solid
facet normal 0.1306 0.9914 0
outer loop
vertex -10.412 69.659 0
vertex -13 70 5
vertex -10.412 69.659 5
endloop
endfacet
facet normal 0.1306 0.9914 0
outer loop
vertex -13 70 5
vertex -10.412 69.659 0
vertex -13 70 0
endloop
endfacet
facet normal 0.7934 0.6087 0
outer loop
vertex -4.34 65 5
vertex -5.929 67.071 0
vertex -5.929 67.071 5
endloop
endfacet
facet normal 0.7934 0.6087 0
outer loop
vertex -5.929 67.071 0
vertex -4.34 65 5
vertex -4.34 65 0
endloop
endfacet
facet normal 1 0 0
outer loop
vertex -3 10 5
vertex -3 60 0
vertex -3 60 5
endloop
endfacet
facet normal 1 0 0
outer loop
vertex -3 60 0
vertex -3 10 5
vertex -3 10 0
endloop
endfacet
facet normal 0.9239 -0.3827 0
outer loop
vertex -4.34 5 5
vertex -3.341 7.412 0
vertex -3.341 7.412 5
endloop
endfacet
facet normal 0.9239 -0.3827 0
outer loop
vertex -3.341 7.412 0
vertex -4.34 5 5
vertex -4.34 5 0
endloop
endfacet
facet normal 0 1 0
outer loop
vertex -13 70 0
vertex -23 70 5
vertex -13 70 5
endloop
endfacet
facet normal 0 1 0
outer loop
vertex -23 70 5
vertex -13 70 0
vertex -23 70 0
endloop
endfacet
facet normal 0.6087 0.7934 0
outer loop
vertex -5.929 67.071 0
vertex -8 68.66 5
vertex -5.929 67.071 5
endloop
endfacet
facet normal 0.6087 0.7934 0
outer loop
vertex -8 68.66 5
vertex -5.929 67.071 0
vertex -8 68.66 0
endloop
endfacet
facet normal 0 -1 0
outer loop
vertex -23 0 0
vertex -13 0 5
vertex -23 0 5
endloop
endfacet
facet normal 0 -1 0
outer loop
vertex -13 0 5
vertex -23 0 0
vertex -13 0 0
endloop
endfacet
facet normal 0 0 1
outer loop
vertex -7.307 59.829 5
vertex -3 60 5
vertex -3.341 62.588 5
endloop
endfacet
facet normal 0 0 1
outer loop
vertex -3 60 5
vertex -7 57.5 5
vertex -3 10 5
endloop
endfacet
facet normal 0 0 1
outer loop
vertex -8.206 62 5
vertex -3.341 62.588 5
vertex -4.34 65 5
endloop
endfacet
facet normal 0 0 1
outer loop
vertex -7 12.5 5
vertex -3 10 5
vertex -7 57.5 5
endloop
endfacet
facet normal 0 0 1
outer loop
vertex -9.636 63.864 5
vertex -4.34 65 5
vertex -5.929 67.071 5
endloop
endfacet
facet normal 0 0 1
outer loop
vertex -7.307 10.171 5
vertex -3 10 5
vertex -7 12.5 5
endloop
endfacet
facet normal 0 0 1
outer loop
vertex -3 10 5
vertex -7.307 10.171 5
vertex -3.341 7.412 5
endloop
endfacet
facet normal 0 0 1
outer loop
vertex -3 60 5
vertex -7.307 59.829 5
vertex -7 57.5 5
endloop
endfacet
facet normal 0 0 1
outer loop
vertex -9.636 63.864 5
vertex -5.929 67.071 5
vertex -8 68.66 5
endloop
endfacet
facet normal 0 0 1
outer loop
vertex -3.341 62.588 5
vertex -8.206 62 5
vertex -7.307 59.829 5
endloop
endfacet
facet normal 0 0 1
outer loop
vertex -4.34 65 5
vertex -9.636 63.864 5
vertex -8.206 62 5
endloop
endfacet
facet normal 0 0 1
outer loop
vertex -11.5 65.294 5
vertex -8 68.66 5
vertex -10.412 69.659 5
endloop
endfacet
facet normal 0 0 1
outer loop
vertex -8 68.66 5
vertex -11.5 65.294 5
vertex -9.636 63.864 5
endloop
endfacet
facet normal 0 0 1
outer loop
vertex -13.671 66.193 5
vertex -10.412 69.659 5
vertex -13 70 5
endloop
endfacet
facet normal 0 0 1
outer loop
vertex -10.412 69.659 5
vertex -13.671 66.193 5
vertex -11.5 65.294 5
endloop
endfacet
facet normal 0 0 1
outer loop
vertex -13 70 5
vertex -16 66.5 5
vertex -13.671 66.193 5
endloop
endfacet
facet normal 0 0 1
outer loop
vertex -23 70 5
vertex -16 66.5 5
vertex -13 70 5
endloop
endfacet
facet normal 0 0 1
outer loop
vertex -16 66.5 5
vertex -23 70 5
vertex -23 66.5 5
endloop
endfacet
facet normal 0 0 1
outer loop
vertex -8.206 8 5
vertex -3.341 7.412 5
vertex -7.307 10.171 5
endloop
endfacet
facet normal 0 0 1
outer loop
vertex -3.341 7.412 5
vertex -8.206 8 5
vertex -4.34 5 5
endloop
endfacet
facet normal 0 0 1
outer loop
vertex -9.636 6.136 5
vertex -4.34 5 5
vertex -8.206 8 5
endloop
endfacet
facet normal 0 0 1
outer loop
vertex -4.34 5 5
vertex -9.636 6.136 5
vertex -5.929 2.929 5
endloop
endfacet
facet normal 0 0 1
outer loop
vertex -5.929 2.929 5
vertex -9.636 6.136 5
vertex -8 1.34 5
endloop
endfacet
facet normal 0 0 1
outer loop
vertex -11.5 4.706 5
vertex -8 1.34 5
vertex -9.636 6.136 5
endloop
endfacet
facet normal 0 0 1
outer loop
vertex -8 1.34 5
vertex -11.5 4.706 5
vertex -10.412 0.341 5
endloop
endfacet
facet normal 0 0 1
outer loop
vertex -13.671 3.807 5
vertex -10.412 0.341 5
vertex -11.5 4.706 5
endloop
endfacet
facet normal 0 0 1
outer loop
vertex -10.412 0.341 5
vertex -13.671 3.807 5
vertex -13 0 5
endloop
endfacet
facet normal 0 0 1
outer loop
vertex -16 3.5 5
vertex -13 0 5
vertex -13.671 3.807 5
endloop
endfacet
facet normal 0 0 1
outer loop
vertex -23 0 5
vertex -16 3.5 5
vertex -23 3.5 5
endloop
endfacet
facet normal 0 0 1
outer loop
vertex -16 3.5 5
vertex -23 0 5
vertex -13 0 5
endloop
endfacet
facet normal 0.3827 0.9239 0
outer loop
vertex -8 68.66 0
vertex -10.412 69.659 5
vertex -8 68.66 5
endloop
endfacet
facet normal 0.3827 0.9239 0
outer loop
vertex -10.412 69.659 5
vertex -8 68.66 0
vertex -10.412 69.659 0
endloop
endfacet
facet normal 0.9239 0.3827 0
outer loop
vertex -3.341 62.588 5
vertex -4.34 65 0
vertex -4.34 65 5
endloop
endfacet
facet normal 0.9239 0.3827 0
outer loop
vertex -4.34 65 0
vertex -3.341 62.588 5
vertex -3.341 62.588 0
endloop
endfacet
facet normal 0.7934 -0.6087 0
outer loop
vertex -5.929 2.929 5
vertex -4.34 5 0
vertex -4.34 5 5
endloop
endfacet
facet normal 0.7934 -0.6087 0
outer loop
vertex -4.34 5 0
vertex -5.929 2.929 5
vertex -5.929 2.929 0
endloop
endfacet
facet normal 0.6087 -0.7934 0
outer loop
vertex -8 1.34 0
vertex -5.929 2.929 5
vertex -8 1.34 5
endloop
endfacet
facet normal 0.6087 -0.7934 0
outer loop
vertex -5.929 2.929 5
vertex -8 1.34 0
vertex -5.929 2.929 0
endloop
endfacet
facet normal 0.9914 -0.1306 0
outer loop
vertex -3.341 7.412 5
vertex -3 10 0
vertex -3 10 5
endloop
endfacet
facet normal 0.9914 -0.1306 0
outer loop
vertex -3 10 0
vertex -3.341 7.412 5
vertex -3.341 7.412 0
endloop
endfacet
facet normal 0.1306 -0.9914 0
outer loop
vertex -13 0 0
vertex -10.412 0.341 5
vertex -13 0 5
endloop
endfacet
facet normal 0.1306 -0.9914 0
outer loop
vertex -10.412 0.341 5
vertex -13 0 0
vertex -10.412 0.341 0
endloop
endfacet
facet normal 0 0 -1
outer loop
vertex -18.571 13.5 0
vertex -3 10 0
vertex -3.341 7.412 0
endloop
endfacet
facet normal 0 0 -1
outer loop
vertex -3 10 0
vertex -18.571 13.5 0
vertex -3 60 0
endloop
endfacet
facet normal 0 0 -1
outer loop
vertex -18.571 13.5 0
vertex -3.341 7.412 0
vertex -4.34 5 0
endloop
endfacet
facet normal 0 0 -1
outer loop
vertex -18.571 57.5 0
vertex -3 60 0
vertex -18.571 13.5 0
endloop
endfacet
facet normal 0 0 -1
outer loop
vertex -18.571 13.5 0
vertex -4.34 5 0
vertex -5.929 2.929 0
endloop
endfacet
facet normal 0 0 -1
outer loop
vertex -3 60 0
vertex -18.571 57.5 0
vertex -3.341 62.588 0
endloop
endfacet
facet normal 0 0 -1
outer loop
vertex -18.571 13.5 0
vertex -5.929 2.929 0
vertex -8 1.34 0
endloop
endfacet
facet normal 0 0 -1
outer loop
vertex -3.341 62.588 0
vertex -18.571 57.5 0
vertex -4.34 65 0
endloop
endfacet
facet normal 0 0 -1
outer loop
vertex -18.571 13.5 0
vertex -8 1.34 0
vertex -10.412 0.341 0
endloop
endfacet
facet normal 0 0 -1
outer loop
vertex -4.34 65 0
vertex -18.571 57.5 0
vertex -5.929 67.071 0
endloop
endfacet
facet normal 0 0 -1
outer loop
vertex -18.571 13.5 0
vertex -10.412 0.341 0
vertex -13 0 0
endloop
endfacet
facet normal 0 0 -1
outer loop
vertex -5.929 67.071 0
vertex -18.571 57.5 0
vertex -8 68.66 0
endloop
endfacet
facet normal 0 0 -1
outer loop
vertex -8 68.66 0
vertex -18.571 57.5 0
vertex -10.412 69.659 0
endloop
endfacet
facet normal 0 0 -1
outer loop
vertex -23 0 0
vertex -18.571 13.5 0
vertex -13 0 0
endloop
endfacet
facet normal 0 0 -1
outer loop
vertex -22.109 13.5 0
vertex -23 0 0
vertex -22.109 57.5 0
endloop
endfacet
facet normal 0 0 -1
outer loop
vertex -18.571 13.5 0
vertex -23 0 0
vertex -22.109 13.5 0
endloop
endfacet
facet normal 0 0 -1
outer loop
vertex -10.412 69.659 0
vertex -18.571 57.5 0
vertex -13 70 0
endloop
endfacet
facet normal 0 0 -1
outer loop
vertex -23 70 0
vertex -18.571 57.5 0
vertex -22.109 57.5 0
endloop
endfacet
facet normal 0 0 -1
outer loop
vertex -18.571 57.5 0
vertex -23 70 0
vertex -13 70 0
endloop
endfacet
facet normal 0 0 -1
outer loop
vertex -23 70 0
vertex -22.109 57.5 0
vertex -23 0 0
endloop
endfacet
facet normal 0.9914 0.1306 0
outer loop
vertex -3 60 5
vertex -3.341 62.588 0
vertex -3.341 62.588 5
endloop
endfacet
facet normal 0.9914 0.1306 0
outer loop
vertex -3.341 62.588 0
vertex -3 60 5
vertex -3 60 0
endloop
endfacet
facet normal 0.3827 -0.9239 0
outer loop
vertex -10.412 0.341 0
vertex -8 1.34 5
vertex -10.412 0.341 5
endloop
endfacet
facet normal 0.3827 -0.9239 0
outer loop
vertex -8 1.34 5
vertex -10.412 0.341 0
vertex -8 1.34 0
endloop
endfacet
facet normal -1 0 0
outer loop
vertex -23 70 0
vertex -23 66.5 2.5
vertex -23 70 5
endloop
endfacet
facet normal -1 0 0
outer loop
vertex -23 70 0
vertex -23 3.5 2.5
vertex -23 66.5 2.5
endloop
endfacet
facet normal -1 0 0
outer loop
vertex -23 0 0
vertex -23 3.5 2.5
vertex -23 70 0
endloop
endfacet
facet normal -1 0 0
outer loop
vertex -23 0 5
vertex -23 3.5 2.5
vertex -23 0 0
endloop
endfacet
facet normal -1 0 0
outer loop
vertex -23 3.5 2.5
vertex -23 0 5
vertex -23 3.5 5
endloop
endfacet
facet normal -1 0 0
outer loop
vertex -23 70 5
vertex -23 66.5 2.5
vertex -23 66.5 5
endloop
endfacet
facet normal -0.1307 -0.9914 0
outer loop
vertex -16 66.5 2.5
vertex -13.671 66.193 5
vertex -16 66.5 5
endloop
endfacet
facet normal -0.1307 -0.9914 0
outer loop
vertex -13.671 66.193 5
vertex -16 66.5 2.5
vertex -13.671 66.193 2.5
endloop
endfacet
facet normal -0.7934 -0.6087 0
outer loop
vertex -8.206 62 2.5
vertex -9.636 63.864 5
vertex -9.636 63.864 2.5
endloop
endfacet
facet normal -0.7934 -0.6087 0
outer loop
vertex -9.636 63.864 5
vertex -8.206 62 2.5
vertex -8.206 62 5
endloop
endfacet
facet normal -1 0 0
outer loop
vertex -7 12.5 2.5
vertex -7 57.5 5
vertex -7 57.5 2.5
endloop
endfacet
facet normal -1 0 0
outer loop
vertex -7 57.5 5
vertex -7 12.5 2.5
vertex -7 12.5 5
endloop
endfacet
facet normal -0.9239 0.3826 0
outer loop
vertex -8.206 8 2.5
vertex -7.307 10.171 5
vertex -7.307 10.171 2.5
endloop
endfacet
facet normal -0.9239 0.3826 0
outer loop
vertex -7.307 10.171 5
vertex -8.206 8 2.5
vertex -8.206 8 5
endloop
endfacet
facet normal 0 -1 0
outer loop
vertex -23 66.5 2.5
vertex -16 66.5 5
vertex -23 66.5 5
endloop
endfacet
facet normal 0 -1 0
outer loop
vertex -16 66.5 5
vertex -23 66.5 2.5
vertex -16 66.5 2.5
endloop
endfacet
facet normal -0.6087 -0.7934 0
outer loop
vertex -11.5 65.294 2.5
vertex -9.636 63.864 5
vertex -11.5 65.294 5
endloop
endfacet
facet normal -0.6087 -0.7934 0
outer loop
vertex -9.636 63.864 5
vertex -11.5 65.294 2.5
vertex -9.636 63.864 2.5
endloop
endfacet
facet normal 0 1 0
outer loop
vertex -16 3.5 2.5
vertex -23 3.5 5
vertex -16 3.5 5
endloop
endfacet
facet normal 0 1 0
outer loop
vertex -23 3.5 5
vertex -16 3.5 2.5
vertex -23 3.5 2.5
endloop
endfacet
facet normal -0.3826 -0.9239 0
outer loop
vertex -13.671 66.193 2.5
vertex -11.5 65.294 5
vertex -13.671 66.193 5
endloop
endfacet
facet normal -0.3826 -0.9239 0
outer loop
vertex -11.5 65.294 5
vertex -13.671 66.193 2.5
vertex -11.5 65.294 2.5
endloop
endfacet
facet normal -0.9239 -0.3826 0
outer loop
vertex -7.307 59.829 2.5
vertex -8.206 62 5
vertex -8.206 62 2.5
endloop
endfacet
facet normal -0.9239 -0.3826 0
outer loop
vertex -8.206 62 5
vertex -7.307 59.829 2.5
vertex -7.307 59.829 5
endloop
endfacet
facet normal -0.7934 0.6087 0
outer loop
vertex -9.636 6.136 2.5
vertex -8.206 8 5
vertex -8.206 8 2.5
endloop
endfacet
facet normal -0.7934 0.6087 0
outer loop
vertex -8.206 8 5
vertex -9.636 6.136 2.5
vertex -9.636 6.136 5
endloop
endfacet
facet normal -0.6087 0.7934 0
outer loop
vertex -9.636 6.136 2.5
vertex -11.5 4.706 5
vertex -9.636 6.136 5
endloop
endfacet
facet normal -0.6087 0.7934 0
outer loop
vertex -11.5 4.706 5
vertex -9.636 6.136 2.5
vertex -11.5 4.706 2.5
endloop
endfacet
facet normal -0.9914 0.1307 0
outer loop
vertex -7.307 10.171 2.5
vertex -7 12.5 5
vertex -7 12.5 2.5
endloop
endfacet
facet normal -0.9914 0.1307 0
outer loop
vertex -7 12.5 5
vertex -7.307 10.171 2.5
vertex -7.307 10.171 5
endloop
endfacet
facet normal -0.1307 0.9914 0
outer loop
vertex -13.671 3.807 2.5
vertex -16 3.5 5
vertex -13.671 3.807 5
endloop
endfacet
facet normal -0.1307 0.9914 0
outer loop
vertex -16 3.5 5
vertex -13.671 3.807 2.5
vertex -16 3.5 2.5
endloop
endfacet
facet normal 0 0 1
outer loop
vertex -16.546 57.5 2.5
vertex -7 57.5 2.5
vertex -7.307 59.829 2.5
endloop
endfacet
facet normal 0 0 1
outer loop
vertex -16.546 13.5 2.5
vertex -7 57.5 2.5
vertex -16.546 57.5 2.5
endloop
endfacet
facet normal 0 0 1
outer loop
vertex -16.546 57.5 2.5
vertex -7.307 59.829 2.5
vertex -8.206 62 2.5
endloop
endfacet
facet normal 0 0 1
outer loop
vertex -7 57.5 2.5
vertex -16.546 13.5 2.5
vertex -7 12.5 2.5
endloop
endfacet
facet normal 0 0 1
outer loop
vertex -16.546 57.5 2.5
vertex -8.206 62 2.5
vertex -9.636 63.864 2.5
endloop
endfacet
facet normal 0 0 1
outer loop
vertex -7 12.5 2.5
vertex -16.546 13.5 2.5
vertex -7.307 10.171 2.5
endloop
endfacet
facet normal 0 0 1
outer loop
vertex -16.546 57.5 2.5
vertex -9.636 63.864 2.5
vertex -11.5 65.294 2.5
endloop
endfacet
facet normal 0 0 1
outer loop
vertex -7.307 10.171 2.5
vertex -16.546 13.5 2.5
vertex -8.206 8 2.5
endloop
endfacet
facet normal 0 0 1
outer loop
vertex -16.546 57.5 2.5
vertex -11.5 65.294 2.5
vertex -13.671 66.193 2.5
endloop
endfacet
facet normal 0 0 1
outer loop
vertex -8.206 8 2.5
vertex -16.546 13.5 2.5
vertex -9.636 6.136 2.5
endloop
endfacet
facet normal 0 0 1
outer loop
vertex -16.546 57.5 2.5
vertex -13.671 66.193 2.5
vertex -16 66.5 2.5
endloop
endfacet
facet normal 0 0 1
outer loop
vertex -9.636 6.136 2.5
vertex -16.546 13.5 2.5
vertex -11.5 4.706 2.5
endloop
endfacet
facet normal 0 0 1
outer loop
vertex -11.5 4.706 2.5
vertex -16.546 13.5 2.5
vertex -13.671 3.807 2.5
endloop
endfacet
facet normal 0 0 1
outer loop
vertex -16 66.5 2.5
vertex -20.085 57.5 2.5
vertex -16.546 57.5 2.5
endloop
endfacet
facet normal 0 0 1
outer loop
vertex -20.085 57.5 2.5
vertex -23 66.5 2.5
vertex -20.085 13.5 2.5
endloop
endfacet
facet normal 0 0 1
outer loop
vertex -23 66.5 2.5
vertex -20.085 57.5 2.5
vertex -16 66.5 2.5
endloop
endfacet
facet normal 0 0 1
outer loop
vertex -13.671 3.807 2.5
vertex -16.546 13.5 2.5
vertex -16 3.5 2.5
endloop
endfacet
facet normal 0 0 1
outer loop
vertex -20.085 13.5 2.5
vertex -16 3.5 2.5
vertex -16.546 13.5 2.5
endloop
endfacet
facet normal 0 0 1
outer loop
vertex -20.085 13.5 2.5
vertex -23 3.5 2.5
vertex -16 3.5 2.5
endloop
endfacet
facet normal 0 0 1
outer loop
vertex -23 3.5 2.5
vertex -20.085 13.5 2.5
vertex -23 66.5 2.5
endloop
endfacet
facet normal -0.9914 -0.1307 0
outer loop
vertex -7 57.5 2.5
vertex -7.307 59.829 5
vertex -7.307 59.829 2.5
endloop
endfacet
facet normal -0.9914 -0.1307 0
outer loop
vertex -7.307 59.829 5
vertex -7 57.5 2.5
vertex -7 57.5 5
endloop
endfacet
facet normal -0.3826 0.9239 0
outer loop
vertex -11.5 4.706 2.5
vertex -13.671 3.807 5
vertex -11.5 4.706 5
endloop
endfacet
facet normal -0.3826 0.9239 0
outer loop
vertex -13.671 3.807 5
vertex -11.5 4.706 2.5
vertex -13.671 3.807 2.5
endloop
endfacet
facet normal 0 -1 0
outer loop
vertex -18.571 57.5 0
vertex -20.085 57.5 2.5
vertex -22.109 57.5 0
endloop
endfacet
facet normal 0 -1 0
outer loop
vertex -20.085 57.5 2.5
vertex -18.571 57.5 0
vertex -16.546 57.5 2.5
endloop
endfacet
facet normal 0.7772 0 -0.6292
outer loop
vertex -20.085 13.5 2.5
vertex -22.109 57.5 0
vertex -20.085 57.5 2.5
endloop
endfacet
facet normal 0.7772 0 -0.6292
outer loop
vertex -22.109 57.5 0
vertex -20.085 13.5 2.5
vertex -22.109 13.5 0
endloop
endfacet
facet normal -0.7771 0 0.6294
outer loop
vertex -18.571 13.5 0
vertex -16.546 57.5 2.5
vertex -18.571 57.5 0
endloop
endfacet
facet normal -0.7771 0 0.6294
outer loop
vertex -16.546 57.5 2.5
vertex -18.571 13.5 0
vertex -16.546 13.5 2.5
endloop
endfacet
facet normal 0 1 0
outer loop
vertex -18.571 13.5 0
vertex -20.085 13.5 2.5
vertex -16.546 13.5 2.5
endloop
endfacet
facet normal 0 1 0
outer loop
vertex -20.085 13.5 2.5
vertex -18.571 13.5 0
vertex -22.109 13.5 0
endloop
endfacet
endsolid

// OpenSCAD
body();

translate([0,-18,0])
  latch();

!translate([-23,10,0])
  recessed_handle();

module body() {
  union() {
    anchor();
    translate([23,2,2.5])
      rotate([0,-51,0])
      difference() {
        bridge();
      }
  }
}

module recessed_handle() {
  difference() {
      handle();
      translate([-2,2.5,2.5])
        scale([0.9,0.9,0.9]) 
        handle();
      translate([2,3.5,-3])
        rotate([0,-51,0])
        scale([1.1,1.1,1.1])
        cube([8,40,2.5]);
  }
}

module handle() {
  $fn=24;
  difference() {
    minkowski() {
      cube([10,50,2.5]);
      cylinder(r=10, h=2.5);
    }
    translate([-20,-20,-2])
      cube([20,90,10]);
  }
}

module bridge() {
  difference() {
    union() {
      difference() {
        cube([25,40,2.5]);
        translate([-1,12.5,-1])
          cube([8,15,5]);
      }
      translate([25,0,0])
        rotate([0,-15,0])
        cube([8,40,2.5]);
    }
    translate([28.5,-5,7])
      rotate([0,51,0])
      cube([10,50,10]);
    translate([6.9,12.5,1.51])
      latch();
  }
}

module latch() {
  difference() {
    union() {
      cube([14,15,1]);
      translate([1,3,0])
        cube([2.5,8,12]);
      translate([0,8.25,0])
        rotate([90,0,0])
        linear_extrude(height=2.5)
          polygon(points=[[1,0],[11,0],[1,10]],
                  paths=[[0,1,2]]);
      translate([0,11,8])
        catch();
    }
    translate([-6,1,12])
      cube([10,12,4]);
  }
}

module catch() {
  translate([0,0,0])
    rotate([270,180,180])
      linear_extrude(height=8)
      polygon(points=[[2.5,0],[-4,0],[2.5,7]],
              paths=[[0,1,2]]);
}

module anchor() {
  difference() {
    cube([23,44,5]);
    translate([8.5,8,-2]) 
      cylinder(r=4, h=9);
    translate([8.5,36,-2]) 
      cylinder(r=4, h=9);
    translate([-5,14.5,-3])
      cube([30,15,10]);
  }
}
